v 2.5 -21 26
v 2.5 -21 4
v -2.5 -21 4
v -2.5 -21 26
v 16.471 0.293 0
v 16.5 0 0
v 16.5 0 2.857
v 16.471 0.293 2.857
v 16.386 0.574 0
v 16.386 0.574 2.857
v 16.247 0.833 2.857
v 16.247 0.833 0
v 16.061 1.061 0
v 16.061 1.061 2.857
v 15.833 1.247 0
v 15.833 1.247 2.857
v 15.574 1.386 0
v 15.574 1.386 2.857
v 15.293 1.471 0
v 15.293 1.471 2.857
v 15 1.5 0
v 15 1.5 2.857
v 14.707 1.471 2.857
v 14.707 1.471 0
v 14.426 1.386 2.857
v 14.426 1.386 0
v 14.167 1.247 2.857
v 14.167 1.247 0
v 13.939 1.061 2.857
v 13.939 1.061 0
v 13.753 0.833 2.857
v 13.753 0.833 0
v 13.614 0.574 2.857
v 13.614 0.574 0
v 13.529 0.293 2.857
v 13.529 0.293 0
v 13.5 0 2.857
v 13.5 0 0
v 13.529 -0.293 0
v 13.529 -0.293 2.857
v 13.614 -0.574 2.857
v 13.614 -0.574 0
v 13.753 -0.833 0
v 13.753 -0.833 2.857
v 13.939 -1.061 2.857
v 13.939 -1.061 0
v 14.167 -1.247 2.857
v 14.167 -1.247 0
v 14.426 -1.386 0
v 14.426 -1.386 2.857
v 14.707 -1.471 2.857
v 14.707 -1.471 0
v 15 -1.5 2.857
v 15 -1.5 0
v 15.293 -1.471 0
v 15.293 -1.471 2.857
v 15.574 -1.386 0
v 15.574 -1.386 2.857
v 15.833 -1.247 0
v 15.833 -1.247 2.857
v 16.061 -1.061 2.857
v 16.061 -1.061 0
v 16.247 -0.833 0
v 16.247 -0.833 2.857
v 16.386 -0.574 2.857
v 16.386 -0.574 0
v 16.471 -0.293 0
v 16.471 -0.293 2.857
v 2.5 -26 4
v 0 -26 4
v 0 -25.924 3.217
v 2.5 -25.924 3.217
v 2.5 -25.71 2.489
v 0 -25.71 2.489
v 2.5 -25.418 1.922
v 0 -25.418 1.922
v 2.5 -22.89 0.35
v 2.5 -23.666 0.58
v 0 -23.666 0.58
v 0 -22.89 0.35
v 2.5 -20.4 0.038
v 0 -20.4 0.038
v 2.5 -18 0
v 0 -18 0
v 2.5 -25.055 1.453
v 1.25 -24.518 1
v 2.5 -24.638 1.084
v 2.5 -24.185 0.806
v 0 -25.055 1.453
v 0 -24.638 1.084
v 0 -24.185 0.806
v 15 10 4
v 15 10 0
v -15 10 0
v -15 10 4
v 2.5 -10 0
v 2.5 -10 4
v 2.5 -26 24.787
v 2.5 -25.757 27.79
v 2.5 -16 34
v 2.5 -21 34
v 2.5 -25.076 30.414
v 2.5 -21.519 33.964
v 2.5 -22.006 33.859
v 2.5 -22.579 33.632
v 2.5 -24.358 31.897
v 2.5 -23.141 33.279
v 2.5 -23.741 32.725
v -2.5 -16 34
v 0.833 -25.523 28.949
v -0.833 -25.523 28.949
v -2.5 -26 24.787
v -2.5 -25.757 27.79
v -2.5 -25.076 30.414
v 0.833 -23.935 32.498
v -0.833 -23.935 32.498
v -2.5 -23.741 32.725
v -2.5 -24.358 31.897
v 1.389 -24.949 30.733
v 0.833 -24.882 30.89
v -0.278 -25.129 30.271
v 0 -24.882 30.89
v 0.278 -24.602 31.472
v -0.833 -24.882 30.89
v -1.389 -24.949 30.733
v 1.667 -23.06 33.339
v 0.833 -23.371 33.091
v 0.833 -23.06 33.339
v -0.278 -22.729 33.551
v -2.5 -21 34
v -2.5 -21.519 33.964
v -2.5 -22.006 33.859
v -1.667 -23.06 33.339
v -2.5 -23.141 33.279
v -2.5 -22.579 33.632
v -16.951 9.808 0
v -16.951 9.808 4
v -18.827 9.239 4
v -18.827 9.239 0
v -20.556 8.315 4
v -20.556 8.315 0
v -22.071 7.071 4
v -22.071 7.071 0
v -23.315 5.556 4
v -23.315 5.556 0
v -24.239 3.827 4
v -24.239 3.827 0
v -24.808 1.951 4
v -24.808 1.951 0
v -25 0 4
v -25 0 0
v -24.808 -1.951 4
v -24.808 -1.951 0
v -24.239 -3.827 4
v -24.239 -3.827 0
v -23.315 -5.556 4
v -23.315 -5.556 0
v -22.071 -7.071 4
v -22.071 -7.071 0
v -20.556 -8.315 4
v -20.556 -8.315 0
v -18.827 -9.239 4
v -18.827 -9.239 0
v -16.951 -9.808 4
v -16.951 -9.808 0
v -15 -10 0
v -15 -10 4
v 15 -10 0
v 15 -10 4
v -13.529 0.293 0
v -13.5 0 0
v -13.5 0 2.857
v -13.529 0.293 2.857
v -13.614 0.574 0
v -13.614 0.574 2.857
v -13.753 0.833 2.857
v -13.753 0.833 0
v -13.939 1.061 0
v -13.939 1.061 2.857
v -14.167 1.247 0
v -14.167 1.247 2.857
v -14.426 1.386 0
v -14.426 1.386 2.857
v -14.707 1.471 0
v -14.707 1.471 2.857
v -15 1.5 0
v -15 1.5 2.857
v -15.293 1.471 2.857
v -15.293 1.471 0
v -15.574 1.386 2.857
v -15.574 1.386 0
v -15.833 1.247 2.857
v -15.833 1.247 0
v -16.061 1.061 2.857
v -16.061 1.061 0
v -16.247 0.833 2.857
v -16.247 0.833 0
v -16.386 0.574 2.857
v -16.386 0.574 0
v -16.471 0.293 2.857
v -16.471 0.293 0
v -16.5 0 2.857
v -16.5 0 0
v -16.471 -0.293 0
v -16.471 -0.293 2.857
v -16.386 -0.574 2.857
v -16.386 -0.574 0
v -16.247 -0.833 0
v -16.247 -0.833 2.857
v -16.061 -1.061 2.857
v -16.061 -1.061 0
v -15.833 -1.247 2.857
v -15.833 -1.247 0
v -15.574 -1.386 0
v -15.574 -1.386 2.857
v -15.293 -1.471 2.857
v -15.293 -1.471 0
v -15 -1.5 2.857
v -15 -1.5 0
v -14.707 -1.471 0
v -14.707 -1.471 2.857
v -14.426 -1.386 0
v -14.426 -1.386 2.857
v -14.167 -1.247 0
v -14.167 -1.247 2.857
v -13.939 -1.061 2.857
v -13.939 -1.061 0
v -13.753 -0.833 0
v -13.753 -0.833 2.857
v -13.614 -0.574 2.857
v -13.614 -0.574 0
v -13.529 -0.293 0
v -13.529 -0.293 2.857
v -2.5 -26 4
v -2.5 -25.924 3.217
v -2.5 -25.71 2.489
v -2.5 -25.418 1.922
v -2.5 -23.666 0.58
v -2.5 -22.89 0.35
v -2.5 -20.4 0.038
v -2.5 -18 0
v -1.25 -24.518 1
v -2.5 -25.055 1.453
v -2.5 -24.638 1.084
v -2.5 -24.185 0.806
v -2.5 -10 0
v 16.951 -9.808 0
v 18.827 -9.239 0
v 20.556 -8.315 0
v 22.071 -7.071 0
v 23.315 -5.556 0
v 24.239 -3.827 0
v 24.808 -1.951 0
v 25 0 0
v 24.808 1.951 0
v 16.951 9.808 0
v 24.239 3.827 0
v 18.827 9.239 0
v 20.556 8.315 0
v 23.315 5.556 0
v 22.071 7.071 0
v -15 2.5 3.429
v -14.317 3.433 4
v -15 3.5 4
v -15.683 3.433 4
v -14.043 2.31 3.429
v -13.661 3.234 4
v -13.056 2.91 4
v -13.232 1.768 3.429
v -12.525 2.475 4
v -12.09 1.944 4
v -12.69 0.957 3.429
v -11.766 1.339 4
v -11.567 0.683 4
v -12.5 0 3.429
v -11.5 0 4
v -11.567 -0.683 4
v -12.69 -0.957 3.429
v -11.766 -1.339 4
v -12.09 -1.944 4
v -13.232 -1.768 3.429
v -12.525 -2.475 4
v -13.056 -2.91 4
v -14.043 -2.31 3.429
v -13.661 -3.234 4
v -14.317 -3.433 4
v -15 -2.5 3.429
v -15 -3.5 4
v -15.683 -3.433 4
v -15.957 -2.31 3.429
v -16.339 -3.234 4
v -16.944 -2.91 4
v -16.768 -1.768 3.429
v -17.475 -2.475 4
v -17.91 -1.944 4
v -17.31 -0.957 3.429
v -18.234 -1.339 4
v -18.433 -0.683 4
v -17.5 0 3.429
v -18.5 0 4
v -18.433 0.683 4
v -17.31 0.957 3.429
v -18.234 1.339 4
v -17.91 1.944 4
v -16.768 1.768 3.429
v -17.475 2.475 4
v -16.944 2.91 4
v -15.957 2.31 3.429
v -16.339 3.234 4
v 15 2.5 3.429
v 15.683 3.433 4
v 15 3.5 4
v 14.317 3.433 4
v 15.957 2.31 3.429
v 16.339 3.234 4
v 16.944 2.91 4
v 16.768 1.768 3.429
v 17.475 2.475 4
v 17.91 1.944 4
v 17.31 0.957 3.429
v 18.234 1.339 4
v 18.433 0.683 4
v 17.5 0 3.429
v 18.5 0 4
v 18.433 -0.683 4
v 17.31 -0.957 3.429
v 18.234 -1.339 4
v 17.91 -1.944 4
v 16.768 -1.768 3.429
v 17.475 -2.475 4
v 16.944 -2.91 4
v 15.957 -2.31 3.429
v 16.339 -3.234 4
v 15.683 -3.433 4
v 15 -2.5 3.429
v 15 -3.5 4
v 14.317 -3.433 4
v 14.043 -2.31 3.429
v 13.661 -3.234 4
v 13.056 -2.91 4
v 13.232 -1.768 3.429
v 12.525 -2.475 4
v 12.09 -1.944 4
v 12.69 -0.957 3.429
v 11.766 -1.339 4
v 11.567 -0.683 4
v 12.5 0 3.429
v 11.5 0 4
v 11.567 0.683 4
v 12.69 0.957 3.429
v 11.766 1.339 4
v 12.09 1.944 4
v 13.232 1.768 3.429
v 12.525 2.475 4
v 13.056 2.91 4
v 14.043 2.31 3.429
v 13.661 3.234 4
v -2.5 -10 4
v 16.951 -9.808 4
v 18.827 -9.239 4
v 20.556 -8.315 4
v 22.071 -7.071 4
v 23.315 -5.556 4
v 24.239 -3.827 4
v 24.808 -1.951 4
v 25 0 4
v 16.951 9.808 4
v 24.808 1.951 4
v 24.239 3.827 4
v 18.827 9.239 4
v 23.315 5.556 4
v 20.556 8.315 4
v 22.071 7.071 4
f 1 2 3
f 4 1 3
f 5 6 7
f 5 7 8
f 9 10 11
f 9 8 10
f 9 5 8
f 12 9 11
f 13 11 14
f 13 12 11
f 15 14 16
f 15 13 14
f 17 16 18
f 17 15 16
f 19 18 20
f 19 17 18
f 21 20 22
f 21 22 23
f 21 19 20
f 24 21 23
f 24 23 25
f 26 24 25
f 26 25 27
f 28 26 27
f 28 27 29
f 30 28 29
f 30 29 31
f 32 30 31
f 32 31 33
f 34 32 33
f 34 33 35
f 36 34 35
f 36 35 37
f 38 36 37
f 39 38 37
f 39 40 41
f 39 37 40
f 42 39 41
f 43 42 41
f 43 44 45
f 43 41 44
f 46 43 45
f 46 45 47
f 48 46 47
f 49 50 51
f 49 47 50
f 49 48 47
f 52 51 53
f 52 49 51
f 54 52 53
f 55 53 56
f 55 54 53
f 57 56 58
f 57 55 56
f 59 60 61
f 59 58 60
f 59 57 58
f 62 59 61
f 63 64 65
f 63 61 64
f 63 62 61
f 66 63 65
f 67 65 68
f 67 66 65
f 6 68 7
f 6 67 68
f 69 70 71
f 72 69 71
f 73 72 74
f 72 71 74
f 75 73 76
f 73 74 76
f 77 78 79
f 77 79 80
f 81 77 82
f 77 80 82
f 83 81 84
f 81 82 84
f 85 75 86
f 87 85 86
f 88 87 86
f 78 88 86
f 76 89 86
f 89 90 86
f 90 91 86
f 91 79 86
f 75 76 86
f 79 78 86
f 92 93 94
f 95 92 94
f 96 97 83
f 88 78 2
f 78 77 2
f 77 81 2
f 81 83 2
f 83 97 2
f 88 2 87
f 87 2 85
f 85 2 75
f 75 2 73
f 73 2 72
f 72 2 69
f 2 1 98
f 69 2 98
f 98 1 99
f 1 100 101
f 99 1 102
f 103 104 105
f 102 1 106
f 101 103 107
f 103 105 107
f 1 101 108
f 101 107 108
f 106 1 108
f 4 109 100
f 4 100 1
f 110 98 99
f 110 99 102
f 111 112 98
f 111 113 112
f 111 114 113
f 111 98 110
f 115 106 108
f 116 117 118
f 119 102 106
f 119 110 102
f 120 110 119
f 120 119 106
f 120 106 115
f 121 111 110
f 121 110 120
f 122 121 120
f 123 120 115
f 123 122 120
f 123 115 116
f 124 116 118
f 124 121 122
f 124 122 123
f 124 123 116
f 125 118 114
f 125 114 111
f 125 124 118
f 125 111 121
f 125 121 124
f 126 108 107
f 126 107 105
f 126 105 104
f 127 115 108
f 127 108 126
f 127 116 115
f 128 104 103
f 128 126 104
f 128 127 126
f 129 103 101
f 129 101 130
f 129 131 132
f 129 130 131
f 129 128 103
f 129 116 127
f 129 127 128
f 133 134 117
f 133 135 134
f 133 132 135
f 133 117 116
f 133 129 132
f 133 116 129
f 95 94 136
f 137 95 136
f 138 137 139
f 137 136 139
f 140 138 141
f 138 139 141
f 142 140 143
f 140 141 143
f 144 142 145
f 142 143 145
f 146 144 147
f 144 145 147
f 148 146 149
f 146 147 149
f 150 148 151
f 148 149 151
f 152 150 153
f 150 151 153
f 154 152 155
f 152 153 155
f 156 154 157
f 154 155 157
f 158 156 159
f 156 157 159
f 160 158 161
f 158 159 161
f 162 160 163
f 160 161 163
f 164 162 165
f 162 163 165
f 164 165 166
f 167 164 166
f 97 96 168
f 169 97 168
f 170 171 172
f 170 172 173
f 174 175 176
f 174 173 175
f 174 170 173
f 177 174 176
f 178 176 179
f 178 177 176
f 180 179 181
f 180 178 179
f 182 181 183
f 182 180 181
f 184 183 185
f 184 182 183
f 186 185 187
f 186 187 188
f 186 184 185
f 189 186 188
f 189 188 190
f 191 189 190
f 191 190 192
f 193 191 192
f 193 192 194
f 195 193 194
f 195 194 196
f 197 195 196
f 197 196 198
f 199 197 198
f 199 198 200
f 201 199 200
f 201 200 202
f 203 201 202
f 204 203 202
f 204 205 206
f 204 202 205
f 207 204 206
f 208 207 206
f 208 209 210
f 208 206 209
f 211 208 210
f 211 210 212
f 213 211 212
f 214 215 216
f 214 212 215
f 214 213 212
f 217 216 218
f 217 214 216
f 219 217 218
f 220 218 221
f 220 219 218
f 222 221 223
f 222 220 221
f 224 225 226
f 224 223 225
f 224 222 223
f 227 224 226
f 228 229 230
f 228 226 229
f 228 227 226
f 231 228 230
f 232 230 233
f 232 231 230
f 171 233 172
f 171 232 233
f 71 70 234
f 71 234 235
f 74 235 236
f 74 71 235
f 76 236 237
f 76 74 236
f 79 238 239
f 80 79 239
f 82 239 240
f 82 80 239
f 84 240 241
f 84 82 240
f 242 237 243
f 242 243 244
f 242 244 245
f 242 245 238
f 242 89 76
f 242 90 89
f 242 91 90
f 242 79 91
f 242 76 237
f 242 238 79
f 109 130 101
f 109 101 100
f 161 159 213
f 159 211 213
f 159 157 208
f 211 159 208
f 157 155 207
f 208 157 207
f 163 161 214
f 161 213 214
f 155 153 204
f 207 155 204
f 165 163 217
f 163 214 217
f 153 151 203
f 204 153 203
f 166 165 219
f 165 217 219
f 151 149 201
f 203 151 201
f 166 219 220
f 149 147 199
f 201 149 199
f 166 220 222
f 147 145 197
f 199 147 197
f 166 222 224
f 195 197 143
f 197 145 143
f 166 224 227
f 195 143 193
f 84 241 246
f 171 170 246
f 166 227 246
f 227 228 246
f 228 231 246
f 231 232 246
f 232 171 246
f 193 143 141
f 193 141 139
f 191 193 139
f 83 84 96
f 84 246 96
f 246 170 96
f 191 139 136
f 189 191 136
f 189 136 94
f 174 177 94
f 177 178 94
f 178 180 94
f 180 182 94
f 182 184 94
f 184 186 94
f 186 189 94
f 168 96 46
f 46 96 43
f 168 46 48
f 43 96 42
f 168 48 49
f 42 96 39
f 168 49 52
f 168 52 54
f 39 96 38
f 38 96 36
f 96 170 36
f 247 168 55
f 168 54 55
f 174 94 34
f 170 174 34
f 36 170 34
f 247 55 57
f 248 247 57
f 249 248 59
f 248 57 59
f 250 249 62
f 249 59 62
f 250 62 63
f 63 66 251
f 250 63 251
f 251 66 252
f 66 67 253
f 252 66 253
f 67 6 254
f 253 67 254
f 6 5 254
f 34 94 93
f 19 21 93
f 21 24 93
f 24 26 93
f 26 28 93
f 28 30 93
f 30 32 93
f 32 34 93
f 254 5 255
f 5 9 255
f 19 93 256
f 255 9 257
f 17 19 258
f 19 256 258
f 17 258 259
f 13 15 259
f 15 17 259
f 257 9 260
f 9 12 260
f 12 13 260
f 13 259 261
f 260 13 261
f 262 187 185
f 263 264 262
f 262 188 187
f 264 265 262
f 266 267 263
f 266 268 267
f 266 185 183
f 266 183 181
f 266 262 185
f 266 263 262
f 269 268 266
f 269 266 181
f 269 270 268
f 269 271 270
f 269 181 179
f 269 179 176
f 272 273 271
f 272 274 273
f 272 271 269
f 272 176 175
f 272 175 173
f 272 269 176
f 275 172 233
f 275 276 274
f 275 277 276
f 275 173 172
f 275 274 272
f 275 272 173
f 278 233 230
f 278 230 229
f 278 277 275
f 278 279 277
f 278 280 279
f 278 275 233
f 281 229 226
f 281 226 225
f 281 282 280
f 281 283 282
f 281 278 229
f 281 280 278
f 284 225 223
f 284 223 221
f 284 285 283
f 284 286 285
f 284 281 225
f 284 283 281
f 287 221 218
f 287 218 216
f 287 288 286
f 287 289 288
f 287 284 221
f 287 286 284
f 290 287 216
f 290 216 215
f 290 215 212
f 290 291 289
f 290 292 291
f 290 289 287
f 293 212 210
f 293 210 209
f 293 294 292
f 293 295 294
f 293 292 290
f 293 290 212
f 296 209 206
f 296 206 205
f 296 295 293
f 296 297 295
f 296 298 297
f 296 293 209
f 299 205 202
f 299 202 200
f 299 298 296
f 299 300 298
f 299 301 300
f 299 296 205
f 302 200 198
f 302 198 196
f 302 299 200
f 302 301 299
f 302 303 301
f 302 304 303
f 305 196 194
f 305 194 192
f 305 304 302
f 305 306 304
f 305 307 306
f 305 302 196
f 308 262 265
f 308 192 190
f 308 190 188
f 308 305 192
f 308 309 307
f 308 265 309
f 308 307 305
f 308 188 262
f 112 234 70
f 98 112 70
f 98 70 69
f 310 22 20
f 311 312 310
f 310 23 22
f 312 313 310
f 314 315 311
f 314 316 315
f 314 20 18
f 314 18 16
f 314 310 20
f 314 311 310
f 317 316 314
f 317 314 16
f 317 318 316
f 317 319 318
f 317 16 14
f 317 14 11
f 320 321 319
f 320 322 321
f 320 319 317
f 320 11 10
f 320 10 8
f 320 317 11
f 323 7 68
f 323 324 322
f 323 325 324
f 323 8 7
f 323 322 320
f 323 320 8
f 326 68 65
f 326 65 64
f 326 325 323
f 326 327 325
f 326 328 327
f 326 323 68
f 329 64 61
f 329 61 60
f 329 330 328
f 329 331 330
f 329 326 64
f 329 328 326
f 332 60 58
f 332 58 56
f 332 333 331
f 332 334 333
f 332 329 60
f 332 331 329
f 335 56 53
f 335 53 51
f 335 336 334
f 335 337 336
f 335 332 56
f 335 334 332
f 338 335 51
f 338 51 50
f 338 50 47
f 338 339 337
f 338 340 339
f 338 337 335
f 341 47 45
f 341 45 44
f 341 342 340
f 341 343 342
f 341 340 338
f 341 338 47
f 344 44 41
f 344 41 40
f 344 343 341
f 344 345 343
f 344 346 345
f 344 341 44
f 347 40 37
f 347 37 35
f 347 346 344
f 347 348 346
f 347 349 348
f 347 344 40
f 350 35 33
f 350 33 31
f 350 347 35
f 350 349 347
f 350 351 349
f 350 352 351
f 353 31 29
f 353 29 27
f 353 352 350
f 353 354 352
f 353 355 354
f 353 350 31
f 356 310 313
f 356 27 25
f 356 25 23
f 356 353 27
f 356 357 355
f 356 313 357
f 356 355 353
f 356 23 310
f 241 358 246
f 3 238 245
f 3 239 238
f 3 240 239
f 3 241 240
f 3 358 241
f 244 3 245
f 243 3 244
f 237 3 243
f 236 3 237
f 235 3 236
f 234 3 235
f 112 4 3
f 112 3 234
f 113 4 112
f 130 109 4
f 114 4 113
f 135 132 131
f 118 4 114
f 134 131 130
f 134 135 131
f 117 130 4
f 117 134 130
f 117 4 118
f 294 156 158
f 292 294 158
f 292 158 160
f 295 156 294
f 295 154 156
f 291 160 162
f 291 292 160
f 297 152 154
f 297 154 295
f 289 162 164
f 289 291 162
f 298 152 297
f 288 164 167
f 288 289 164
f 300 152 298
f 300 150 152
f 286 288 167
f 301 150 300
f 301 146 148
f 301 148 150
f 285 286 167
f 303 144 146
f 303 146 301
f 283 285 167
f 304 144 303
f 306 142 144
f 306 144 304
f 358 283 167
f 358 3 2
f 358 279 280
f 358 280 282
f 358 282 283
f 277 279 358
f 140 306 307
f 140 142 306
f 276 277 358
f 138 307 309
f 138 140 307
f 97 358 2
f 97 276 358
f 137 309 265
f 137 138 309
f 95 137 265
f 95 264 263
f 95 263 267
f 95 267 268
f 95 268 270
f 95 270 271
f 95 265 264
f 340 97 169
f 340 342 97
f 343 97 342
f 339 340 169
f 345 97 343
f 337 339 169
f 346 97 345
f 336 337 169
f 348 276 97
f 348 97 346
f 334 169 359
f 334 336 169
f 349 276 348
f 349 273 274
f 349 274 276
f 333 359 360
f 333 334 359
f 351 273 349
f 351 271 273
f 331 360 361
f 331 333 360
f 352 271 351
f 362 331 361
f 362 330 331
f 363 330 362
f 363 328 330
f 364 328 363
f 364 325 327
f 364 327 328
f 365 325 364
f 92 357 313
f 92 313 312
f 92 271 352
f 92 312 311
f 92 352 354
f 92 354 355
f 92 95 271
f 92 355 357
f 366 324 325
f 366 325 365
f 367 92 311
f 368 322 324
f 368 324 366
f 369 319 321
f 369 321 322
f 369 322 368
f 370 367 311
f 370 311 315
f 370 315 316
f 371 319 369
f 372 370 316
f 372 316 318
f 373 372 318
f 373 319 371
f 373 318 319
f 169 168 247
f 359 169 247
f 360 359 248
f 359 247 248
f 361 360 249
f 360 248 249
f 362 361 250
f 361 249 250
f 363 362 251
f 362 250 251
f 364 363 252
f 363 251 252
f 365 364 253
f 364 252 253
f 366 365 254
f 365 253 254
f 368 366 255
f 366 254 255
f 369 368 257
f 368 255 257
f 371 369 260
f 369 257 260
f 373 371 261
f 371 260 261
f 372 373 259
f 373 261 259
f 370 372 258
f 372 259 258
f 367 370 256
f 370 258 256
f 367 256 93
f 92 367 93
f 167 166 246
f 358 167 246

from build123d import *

# Parameters (mm, degrees)
F0_R      = 1.5
F1_DEPTH  = 4
F3_DEPTH  = 2.5
F5_DEPTH  = 30
F7_DEPTH  = 5
F14_DEPTH = 5


with BuildPart() as f1:
    # F0 (on Top) → F1 (new body)
    with BuildSketch(Plane.XY):
        with BuildLine():
            Line((15, 10), (-15, 10))
            ThreePointArc((-15, 10), (-25, 0), (-15, -10))
            Line((-15, -10), (15, -10))
            ThreePointArc((15, -10), (25, 0), (15, 10))
        make_face()
        with Locations((-15, 0)):
            Circle(F0_R, mode=Mode.SUBTRACT)
        with Locations((15, 0)):
            Circle(F0_R, mode=Mode.SUBTRACT)
    extrude(amount=F1_DEPTH)

    # F2 (on Right) → F3 (join, symmetric)
    with BuildSketch(Plane.YZ):
        with BuildLine():
            Line((-10, 0), (-10, 4))
            Line((-10, 4), (-26, 4))
            add(Edge.make_bspline(
                [(-26, 4), (-26, 3), (-25.0865402228, -0.0476028537), (-20, 0), (-18, 0)],
                knots=[0, 0, 0, 0, 0.4160108935, 1, 1, 1, 1], degree=3))
            Line((-18, 0), (-10, 0))
        make_face()
    extrude(amount=F3_DEPTH, both=True)

    # F4 (on face) → F5 (join)
    with BuildSketch(Plane.XY.offset(4)):
        Polygon((-2.5, -21), (-2.5, -26), (0, -26), (2.5, -26), (2.5, -21), align=None)
    extrude(amount=F5_DEPTH)

    # F6 (on face) → F7 (cut, through all)
    with BuildSketch(Plane(origin=(-2.5, 0, 0), x_dir=(0, -1, 0), z_dir=(-1, 0, 0))):
        with BuildLine():
            add(Edge.make_bspline(
                [(26, 24.786574766), (26, 28.7767909467), (24.6865190566, 34), (21, 34)],
                knots=[0, 0, 0, 0, 10.48270979, 10.48270979, 10.48270979, 10.48270979], degree=3))
            Line((26, 24.786574766), (26, 34))
            Line((26, 34), (21, 34))
        make_face()
    extrude(amount=-F7_DEPTH, mode=Mode.SUBTRACT)

    # F9 (on plane+point) → F10 (revolve, cut)
    with BuildSketch(Plane.YZ.offset(15)):
        Polygon((3.5, 4), (0, 4), (0, 2), align=None)
    revolve(axis=Axis((15, 0, 3), (0, 0, -1)), mode=Mode.SUBTRACT)

    # F12 (on plane+point) → F13 (revolve, cut)
    with BuildSketch(Plane.YZ.offset(-15)):
        Polygon((3.5, 4), (0, 4), (0, 2), align=None)
    revolve(axis=Axis((-15, 0, 0), (0, 0, -1)), mode=Mode.SUBTRACT)

    # F6 (on face) → F14 (join, through all)
    with BuildSketch(Plane(origin=(-2.5, 0, 0), x_dir=(0, -1, 0), z_dir=(-1, 0, 0))):
        Polygon((21, 26), (21, 34), (16, 34), align=None)
    extrude(amount=-F14_DEPTH)


solid = f1.part
